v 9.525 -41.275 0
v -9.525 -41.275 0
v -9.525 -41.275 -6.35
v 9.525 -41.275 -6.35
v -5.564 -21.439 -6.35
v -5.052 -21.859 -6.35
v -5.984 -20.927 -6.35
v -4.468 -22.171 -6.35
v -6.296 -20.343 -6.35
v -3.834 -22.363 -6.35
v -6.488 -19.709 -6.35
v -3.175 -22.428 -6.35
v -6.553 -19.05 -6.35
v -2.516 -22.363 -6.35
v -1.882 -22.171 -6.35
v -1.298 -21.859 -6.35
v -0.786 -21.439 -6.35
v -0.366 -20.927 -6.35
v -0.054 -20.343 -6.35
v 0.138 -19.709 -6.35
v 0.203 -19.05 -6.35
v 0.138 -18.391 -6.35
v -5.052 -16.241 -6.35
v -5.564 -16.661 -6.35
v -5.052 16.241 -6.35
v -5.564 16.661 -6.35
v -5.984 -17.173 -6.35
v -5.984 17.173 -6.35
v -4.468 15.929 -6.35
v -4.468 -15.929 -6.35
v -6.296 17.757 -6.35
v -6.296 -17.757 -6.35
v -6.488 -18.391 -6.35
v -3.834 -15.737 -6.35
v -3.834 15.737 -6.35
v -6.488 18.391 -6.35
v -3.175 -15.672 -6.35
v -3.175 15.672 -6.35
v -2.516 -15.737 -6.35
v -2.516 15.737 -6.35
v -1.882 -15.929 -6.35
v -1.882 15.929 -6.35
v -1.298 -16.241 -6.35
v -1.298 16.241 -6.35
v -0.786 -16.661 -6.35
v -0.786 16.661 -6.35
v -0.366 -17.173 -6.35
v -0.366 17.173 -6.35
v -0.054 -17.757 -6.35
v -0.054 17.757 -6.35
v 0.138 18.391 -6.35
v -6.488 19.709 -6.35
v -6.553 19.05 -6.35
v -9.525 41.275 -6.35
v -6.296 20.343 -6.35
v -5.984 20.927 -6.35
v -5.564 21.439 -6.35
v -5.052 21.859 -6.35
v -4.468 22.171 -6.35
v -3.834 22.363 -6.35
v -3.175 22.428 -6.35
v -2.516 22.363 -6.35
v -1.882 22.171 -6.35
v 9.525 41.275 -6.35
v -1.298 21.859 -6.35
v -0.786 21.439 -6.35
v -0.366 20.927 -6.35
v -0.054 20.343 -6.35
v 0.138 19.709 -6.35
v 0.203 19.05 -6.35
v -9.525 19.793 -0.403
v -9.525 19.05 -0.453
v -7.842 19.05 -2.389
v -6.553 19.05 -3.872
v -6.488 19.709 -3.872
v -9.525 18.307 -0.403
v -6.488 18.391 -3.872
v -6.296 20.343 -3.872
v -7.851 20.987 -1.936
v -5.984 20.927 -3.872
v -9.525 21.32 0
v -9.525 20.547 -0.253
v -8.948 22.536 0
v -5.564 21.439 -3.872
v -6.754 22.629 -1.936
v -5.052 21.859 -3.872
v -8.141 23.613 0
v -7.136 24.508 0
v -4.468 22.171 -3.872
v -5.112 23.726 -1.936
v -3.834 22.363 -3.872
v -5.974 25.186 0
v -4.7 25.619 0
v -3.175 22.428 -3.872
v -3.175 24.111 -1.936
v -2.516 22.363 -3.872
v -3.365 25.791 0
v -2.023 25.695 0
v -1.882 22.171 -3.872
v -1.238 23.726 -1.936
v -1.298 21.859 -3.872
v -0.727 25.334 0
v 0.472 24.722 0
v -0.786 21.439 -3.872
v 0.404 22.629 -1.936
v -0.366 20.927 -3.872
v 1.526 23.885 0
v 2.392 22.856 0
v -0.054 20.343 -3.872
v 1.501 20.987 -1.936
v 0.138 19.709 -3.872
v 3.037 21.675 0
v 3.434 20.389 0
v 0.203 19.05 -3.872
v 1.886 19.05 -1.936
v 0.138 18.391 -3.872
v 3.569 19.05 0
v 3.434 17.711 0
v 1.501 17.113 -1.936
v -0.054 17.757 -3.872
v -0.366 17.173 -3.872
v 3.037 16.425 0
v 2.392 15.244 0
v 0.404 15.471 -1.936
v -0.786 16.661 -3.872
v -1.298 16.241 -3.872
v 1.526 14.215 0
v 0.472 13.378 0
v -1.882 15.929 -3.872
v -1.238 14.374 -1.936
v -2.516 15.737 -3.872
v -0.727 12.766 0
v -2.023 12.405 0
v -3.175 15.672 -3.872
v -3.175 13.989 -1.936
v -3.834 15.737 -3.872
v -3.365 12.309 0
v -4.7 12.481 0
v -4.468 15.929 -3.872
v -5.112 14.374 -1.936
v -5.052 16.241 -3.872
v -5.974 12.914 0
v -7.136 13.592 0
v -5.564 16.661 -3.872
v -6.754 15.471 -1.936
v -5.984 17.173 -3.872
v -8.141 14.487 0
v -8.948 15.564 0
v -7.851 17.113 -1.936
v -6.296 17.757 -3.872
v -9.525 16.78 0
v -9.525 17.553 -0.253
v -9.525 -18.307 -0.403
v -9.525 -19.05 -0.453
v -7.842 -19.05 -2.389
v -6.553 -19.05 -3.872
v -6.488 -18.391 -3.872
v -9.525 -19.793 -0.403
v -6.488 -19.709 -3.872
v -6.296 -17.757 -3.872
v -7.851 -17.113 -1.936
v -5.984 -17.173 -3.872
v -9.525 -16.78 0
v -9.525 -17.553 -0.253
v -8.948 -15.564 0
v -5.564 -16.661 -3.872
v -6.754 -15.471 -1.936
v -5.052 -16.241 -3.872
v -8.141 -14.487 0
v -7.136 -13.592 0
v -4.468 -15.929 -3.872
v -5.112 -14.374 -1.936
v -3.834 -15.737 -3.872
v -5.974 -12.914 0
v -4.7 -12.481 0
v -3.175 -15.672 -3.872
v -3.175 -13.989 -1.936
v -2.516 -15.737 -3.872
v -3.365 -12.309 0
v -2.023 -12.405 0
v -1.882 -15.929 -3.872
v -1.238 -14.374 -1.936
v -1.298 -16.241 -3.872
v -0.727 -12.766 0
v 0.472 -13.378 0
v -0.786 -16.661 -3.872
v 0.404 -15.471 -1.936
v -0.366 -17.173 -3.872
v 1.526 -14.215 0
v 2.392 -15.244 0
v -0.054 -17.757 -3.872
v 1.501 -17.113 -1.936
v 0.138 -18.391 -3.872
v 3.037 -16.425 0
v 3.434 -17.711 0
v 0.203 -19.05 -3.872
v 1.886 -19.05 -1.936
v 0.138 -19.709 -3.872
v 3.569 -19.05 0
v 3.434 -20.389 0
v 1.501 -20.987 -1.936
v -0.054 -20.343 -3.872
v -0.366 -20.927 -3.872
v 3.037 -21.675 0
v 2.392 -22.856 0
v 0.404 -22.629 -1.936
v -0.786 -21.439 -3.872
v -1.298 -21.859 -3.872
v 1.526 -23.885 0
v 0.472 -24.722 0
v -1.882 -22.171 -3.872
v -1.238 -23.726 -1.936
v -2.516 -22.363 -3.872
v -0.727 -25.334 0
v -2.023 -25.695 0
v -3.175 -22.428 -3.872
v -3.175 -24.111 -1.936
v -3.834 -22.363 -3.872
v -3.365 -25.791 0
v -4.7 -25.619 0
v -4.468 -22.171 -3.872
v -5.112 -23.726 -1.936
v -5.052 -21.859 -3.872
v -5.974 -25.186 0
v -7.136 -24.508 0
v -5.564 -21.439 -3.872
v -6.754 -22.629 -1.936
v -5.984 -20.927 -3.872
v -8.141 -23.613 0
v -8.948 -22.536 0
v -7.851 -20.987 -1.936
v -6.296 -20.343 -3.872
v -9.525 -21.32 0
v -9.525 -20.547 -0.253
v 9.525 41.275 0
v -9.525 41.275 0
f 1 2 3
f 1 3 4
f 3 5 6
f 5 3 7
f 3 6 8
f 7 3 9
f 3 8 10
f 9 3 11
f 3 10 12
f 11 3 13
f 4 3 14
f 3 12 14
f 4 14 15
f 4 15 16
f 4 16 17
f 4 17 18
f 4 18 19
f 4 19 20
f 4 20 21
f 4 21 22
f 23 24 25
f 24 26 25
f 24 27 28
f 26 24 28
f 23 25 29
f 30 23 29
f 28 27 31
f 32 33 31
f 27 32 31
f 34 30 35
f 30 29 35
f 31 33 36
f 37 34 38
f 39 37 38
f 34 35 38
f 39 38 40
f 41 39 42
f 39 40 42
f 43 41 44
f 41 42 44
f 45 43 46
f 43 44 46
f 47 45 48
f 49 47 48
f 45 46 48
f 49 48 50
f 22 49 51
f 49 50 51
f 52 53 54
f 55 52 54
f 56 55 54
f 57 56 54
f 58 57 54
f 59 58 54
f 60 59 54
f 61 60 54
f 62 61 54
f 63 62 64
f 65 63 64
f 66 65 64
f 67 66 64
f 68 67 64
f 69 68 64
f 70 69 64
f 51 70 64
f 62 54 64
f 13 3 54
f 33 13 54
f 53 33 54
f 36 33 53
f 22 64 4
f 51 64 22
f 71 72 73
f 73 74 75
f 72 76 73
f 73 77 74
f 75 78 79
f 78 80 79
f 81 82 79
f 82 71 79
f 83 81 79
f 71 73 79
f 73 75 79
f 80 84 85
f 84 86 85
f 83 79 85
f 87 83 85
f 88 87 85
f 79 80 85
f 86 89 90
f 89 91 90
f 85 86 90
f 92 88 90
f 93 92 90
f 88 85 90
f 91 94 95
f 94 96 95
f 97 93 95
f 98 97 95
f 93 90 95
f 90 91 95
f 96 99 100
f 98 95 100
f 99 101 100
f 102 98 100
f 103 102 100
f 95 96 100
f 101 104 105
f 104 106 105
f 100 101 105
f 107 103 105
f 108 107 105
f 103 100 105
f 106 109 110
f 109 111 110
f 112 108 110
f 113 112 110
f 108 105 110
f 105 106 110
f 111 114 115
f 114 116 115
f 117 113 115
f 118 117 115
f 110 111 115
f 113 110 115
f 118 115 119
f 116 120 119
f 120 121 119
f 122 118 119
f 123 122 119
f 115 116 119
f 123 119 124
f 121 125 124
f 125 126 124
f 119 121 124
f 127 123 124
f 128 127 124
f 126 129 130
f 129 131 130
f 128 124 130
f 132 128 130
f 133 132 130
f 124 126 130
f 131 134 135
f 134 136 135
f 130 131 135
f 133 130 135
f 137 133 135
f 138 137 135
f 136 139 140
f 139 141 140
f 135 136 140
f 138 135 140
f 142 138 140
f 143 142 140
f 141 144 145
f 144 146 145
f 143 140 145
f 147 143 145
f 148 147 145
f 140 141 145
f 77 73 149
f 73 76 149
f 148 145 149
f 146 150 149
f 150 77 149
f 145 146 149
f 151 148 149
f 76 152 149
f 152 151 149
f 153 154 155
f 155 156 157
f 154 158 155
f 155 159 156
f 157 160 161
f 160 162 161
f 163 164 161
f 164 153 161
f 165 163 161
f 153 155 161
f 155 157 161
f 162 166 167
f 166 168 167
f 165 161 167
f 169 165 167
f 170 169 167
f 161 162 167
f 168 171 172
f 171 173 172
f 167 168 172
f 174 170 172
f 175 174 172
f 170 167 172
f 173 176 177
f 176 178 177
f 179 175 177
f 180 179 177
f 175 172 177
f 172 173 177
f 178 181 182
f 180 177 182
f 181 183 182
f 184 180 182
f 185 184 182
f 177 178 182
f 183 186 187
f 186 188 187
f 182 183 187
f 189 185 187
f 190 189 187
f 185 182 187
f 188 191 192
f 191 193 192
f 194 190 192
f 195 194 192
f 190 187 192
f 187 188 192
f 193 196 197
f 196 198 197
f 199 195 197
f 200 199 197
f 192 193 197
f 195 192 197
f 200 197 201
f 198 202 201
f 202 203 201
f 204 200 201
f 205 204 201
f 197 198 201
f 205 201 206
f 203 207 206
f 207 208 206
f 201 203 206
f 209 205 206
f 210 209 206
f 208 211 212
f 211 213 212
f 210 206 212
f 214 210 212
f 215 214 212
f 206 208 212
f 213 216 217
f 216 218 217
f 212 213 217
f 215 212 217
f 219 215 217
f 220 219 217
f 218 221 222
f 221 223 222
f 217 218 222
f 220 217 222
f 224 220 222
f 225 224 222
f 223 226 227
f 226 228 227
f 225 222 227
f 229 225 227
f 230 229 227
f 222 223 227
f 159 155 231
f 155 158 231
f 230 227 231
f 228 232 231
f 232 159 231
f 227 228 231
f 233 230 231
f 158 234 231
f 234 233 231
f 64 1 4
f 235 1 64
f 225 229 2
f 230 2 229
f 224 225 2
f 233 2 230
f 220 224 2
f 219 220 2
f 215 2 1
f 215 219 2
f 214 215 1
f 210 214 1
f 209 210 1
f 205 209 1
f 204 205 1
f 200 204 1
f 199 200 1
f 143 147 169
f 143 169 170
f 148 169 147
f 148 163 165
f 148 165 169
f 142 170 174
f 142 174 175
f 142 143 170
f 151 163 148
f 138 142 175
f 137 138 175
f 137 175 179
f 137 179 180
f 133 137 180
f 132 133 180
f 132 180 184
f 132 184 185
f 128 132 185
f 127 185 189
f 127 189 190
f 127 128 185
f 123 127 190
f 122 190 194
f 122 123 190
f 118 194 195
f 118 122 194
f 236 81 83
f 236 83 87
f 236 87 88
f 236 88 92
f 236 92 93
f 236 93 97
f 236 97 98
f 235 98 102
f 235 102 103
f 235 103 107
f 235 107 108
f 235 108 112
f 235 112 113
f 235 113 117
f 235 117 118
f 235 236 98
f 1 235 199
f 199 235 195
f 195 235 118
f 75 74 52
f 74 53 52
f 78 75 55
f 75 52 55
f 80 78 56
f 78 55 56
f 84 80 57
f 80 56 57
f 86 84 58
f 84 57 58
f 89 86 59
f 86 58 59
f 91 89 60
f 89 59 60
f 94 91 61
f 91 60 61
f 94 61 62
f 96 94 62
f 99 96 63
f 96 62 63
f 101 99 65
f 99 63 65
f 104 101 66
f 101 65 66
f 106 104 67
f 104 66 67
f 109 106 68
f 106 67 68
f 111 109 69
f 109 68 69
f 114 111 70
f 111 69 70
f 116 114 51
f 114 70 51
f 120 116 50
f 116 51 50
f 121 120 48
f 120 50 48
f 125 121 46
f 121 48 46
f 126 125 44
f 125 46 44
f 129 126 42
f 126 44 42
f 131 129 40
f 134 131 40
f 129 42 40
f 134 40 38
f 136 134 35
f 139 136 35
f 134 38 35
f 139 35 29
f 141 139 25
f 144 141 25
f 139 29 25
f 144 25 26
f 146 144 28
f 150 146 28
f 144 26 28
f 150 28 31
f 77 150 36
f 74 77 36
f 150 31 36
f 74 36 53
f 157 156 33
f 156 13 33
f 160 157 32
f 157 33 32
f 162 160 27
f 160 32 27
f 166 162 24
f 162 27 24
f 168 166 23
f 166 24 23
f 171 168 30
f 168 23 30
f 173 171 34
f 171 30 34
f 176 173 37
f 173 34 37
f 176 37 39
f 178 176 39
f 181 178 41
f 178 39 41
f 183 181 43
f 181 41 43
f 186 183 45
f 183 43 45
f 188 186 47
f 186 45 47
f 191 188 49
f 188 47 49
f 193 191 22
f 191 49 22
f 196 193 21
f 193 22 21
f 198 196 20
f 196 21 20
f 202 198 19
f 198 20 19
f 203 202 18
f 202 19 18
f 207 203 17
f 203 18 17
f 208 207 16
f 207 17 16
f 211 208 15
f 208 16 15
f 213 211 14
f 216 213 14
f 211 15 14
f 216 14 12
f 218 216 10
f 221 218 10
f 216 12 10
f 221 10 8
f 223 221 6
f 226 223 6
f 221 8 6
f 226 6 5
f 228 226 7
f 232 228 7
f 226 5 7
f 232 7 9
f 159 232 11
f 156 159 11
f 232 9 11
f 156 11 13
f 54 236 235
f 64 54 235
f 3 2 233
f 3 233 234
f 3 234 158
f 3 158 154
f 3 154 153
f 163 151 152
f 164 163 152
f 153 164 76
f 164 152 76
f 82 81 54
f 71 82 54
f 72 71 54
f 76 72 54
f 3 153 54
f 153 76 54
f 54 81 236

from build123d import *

# Parameters (mm, degrees)
F0_W           = 19.05
F0_H           = 82.55
F0_R           = 3.571875
F1_DEPTH       = 6.35
F2_D           = 6.7564
F2_CSINK_D     = 13.4874
F2_CSINK_ANGLE = 82


with BuildPart() as f1:
    # F0 (on Top) → F1 (new body)
    with BuildSketch(Plane.XY):
        Rectangle(F0_W, F0_H)
        with Locations((-3.175, -19.05)):
            Circle(F0_R, mode=Mode.SUBTRACT)
        with Locations((-3.175, 19.05)):
            Circle(F0_R, mode=Mode.SUBTRACT)
        with Locations((-3.175, 19.05)):
            Circle(F0_R)
        with Locations((-3.175, -19.05)):
            Circle(F0_R)
    extrude(amount=-F1_DEPTH)

    # F2 (through all)
    with Locations(Plane.XY):
        with Locations((-3.175, 19.05), (-3.175, -19.05)):
            CounterSinkHole(F2_D / 2, F2_CSINK_D / 2, counter_sink_angle=F2_CSINK_ANGLE)


solid = f1.part
